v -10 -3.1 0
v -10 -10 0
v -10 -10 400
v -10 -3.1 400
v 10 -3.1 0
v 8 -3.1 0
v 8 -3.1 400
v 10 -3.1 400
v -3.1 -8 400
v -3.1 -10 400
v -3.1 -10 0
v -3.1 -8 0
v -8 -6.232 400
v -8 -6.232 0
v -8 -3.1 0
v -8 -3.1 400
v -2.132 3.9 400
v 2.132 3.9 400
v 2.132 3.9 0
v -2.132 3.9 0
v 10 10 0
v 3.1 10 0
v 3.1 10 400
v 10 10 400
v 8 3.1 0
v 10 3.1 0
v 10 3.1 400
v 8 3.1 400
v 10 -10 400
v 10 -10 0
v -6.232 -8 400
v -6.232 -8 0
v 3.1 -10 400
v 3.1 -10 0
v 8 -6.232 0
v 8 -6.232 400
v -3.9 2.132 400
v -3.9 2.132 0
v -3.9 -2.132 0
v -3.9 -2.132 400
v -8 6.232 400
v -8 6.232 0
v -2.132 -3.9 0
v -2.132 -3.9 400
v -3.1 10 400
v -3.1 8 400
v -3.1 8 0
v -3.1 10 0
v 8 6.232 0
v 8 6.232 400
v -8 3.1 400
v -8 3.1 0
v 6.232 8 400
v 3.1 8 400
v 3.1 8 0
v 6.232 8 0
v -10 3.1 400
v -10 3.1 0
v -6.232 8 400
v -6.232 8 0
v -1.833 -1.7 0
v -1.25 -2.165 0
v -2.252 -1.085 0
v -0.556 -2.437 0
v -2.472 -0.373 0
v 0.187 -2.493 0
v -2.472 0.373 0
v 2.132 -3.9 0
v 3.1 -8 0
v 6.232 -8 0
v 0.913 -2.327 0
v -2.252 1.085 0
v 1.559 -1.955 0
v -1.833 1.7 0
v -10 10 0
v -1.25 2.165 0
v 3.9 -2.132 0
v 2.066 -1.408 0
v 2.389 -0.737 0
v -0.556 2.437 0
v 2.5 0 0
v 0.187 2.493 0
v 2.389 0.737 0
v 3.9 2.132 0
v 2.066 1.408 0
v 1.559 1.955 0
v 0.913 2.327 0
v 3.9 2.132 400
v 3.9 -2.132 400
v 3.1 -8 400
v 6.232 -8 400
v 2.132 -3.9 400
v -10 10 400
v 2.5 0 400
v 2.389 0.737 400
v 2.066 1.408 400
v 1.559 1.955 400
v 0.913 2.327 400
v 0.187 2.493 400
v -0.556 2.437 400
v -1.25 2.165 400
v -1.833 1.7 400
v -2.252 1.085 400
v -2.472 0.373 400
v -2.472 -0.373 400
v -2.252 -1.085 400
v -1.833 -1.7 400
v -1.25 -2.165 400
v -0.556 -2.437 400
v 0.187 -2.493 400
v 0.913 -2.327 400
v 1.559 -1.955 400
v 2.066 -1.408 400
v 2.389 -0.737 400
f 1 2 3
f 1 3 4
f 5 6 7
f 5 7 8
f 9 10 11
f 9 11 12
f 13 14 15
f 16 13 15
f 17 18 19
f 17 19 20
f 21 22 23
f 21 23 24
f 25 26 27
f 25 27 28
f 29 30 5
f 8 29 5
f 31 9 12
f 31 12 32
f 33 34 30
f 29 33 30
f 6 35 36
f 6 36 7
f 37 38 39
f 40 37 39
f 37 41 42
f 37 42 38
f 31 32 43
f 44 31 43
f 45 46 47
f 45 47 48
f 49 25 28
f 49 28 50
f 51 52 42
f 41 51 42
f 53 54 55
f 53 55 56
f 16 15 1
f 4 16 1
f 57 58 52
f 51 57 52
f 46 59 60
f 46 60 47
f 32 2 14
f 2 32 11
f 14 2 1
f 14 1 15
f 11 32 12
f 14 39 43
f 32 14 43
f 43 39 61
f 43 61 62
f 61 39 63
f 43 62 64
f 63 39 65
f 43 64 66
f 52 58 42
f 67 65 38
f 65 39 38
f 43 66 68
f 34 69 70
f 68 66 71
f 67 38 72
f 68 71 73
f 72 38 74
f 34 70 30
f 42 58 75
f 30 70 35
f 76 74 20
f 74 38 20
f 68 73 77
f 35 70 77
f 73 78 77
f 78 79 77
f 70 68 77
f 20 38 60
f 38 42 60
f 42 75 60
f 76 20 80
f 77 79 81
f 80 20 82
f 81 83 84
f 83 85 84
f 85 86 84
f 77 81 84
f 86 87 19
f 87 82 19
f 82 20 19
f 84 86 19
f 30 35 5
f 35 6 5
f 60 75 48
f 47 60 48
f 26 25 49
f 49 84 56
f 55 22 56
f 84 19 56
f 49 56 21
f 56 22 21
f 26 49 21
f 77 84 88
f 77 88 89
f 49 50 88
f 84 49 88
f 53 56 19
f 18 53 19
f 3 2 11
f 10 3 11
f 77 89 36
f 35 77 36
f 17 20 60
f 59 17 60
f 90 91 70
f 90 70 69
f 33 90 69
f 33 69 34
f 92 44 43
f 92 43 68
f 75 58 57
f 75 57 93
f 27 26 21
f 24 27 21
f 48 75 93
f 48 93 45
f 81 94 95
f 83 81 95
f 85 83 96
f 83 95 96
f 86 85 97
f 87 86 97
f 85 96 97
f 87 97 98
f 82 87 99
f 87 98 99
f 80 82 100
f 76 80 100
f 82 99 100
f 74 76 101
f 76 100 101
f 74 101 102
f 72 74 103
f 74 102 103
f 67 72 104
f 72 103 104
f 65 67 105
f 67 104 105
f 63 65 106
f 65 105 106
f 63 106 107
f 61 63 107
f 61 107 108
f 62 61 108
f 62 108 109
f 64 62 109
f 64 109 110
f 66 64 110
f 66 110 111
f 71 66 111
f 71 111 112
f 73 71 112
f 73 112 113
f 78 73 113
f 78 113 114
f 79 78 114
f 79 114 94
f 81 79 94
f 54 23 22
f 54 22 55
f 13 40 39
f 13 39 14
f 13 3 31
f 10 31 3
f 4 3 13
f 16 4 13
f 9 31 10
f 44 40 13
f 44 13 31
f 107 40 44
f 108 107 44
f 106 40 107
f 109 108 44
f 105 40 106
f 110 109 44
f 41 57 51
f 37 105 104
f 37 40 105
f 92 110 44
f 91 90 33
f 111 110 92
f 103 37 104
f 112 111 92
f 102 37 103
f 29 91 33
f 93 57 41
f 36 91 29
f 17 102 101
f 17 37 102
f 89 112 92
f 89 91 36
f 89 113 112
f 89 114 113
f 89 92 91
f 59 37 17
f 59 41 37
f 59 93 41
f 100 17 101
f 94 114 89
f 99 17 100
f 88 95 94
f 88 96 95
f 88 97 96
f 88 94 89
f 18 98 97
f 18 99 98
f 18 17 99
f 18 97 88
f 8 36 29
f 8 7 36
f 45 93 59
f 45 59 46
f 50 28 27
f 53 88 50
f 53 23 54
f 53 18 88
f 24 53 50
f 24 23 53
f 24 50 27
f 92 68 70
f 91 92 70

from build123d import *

# Parameters (mm, degrees)
SKETCH_W        = 20
SKETCH_H        = 20
PAD_DEPTH       = 400
SKETCH001_R     = 2.5
POCKET_DEPTH    = 400.001
POCKET001_DEPTH = 400.001


with BuildPart() as part:
    # Sketch → Pad (new body)
    with BuildSketch(Plane.XY):
        Rectangle(SKETCH_W, SKETCH_H)
    extrude(amount=PAD_DEPTH)

    # Sketch001 (on Face6 of Pad) → Pocket (cut, through all)
    with BuildSketch(Plane.XY.offset(400)):
        Circle(SKETCH001_R)
        Polygon((-3.1, 10), (3.1, 10), (3.1, 8), (6.232233, 8), (2.132233, 3.9), (-2.132233, 3.9), (-6.232233, 8), (-3.1, 8), align=None)
        Polygon((-3.1, -8), (-6.232233, -8), (-2.132233, -3.9), (2.132233, -3.9), (6.232233, -8), (3.1, -8), (3.1, -10), (-3.1, -10), align=None)
    extrude(amount=-POCKET_DEPTH, mode=Mode.SUBTRACT)

    # Sketch002 (on Face2 of Pocket) → Pocket001 (cut, through all)
    with BuildSketch(Plane(origin=(0, 0, 0), x_dir=(1, 0, 0), z_dir=(0, 0, -1))):
        Polygon((-10, -3.1), (-8, -3.1), (-8, -6.232233), (-3.9, -2.132233), (-3.9, 2.132233), (-8, 6.232233), (-8, 3.1), (-10, 3.1), align=None)
        Polygon((3.9, -2.132233), (3.9, 2.132233), (8, 6.232233), (8, 3.1), (10, 3.1), (10, -3.1), (8, -3.1), (8, -6.232233), align=None)
    extrude(amount=-POCKET001_DEPTH, mode=Mode.SUBTRACT)


solid = part.part
